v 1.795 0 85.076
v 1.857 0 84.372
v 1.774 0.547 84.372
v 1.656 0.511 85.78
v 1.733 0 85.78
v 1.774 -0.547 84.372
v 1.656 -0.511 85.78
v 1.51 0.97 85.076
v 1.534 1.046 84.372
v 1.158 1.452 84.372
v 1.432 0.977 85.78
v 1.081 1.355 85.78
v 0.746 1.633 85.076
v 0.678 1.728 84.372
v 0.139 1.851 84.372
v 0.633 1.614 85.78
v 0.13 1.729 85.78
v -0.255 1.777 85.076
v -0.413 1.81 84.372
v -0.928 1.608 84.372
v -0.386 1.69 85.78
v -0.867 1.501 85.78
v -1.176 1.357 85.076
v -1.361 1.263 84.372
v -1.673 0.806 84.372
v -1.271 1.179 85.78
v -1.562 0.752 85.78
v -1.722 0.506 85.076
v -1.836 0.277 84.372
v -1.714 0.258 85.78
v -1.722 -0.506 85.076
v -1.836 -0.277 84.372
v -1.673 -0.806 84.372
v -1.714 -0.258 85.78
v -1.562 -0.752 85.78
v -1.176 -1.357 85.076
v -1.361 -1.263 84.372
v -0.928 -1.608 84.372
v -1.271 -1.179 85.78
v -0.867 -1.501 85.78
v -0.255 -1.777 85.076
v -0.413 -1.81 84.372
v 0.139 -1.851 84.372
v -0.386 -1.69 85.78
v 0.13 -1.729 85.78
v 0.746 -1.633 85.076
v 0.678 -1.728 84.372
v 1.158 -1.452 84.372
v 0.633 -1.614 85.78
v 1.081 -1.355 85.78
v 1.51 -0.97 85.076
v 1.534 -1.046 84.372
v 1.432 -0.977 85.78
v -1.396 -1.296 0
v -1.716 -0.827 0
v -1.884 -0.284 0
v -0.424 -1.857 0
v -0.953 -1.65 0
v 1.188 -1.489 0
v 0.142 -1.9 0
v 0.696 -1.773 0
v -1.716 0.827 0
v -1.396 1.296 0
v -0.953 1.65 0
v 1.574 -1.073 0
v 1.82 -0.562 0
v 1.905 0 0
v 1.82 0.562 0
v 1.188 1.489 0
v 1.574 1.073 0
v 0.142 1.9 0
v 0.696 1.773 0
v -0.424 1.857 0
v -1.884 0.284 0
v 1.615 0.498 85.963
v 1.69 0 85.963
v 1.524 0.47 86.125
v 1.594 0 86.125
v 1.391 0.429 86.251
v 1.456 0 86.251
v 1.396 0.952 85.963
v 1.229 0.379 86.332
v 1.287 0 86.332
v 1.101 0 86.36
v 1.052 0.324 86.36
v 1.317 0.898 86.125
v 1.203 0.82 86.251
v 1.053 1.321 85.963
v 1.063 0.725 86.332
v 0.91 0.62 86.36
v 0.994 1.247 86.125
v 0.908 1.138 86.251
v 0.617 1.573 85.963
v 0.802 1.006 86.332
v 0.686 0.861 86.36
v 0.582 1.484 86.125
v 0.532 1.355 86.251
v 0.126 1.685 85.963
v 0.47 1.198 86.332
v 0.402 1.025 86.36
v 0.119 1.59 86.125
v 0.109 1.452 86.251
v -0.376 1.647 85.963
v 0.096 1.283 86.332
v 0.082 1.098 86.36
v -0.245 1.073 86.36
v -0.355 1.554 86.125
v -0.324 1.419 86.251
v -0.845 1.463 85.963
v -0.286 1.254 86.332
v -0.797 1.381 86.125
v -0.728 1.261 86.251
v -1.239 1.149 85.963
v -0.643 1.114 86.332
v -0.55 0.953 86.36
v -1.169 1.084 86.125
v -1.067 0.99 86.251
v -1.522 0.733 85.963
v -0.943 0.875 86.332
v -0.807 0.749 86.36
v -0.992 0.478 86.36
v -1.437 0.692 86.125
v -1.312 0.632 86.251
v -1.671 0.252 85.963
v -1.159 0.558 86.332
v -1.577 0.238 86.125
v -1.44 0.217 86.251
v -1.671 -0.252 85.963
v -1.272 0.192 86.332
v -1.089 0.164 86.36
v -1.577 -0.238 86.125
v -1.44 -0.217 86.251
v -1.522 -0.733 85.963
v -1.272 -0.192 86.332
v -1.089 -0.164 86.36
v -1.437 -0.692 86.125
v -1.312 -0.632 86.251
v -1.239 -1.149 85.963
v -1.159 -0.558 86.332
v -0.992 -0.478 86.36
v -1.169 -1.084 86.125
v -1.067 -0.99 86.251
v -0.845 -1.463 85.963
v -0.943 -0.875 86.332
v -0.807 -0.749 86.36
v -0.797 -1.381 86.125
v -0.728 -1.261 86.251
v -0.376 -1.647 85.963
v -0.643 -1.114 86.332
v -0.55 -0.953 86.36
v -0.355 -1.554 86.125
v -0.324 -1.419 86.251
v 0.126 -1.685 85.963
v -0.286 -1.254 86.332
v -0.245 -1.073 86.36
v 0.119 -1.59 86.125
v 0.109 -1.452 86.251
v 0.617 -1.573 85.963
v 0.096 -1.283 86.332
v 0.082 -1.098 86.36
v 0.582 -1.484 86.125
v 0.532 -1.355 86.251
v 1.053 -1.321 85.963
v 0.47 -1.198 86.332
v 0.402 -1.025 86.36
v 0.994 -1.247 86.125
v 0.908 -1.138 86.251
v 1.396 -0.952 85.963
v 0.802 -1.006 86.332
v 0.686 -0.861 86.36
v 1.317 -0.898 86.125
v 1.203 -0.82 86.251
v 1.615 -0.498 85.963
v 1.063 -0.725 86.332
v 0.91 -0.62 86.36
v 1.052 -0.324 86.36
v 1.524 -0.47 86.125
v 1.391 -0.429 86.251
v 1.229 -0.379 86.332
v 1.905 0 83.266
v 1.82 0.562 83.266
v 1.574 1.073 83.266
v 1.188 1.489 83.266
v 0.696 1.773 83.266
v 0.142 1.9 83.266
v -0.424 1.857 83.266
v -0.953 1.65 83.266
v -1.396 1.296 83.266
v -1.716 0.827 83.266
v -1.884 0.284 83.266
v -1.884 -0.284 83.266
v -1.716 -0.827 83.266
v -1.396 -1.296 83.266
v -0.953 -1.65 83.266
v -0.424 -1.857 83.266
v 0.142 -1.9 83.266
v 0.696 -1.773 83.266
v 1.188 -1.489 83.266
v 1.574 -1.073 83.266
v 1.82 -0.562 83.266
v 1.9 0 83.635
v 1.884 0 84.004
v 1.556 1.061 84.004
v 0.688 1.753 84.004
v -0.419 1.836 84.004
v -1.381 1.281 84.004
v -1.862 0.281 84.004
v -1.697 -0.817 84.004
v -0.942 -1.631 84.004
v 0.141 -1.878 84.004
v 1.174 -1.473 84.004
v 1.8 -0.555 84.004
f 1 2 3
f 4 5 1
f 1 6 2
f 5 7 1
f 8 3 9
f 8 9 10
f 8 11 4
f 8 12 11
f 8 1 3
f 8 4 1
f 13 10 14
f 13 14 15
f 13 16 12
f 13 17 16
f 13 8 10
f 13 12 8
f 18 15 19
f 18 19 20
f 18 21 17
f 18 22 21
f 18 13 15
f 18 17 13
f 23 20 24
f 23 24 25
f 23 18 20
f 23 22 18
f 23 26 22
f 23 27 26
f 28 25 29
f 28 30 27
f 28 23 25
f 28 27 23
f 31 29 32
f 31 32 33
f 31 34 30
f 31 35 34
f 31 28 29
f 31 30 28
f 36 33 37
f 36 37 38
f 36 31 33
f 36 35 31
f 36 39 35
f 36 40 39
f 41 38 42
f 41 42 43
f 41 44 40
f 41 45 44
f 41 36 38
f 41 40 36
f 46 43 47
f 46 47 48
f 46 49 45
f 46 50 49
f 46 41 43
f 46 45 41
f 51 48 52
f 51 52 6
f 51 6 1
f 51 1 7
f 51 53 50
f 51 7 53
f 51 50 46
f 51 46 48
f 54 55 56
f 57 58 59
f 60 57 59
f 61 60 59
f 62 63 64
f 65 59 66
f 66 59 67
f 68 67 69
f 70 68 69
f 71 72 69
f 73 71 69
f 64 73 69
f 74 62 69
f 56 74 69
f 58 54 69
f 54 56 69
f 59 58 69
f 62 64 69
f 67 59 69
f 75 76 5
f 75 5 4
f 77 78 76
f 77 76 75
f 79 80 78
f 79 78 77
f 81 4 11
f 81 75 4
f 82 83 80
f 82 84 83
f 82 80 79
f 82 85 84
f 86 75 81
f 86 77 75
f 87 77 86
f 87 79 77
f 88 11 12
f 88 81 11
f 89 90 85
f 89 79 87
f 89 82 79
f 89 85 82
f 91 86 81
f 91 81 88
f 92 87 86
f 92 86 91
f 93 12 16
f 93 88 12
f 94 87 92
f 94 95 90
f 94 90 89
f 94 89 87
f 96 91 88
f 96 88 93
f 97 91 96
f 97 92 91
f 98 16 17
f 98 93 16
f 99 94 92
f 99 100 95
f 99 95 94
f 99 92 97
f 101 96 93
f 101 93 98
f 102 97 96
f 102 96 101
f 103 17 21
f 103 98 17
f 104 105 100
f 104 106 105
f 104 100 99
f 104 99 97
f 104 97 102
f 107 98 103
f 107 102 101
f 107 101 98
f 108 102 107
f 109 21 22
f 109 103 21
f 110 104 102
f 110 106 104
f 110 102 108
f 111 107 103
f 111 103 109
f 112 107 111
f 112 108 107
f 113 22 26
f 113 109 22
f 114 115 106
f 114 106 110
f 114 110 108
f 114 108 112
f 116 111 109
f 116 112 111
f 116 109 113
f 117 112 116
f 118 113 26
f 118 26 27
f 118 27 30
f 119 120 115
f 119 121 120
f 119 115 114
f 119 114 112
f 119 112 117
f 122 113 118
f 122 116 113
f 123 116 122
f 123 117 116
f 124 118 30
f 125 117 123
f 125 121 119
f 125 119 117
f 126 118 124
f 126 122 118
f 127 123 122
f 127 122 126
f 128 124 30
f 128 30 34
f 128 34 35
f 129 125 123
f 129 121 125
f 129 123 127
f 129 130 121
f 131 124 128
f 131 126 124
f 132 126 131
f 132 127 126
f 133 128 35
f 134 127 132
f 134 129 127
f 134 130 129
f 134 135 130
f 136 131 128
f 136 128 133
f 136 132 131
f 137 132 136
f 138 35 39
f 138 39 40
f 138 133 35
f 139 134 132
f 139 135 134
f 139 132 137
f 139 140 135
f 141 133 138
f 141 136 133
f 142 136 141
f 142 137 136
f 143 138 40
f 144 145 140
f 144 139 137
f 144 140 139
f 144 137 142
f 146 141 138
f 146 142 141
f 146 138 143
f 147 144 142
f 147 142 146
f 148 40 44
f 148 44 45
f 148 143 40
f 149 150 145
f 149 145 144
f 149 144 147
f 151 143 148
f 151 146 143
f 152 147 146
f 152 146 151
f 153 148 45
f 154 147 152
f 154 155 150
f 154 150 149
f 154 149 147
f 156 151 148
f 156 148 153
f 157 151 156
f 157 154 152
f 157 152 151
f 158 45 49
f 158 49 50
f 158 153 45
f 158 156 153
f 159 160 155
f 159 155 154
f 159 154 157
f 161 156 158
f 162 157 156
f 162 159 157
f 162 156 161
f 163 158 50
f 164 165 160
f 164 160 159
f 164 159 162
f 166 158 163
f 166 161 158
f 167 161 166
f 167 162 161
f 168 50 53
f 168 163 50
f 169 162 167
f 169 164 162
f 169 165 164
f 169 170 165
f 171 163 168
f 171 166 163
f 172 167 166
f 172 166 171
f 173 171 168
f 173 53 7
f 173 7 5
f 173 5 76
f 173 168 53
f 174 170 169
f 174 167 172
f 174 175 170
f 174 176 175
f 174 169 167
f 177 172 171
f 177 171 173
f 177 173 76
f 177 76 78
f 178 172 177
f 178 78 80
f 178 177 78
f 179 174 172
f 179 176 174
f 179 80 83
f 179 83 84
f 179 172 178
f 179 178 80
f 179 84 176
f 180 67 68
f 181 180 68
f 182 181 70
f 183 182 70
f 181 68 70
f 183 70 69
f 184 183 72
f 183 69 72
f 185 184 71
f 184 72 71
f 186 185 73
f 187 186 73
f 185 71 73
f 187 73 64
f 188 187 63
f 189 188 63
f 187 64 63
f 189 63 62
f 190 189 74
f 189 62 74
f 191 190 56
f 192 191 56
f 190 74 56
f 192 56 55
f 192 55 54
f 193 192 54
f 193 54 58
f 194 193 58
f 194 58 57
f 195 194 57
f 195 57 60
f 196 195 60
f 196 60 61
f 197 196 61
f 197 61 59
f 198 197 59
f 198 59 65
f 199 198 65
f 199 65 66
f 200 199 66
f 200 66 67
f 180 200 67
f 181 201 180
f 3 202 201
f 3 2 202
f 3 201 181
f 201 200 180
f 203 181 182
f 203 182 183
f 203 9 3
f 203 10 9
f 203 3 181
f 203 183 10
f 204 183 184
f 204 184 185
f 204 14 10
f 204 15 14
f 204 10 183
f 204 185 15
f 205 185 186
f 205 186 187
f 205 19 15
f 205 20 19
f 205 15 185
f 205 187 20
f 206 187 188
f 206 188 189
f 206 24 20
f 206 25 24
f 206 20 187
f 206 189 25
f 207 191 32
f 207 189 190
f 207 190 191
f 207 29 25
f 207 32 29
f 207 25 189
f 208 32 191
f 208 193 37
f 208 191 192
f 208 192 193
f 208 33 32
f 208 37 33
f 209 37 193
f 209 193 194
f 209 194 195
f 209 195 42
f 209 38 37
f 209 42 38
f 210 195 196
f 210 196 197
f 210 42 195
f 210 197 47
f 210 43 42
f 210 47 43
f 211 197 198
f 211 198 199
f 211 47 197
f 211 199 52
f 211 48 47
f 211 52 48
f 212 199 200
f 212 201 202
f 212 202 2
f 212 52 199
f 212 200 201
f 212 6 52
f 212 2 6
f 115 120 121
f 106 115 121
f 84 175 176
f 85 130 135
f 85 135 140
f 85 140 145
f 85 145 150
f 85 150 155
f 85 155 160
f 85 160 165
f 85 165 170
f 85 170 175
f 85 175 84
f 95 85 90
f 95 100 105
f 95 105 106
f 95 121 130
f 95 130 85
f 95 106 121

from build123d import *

# Parameters (mm, degrees)
SKETCH2_R           = 1.905
BOSS_EXTRUDE1_DEPTH = 86.36
CHAMFER1_SIZE       = 2.54
CHAMFER1_SIZE2      = 0.222221205
FILLET1_R           = 12.7
FILLET2_R           = 0.635


with BuildPart() as part:
    # Sketch2 → Boss-Extrude1 (new body)
    with BuildSketch(Plane.XY):
        Circle(SKETCH2_R)
    extrude(amount=BOSS_EXTRUDE1_DEPTH)

    # Chamfer1
    chamfer1_edges = [part.edges().sort_by_distance(p)[0] for p in [
        (-1.905, 0, 86.36),
    ]]
    chamfer1_side = [part.faces().sort_by_distance(p)[0] for p in [
        (-1.905, 0, 43.18),
    ]]
    chamfer(chamfer1_edges, length=CHAMFER1_SIZE, length2=CHAMFER1_SIZE2, reference=chamfer1_side[0])

    # Fillet1
    # the kernel refuses this fillet: 12.7 mm, written as the material it takes off along each edge
    with BuildSketch(Plane(origin=(0, 0, 83.82), x_dir=(1, 0, 0), z_dir=(0, -1, 0))) as fillet1_piece_1:
        with BuildLine():
            CenterArc((1.905 - FILLET1_R, -FILLET1_R * 0.0436609429085), FILLET1_R, 0, 5)
            Line((1.905 - FILLET1_R * 0.00380530190825, FILLET1_R * 0.0434947998391), (1.905, 0))
            Line((1.905, 0), (1.905, -FILLET1_R * 0.0436609429085))
        make_face()
    revolve(axis=Axis((0, 0, 83.82), (0, 0, 1)), mode=Mode.SUBTRACT)

    # Fillet2
    fillet2_edges = [part.edges().sort_by_distance(p)[0] for p in [
        (-1.682778795, 0, 86.36),
    ]]
    fillet(fillet2_edges, radius=FILLET2_R)


solid = part.part
